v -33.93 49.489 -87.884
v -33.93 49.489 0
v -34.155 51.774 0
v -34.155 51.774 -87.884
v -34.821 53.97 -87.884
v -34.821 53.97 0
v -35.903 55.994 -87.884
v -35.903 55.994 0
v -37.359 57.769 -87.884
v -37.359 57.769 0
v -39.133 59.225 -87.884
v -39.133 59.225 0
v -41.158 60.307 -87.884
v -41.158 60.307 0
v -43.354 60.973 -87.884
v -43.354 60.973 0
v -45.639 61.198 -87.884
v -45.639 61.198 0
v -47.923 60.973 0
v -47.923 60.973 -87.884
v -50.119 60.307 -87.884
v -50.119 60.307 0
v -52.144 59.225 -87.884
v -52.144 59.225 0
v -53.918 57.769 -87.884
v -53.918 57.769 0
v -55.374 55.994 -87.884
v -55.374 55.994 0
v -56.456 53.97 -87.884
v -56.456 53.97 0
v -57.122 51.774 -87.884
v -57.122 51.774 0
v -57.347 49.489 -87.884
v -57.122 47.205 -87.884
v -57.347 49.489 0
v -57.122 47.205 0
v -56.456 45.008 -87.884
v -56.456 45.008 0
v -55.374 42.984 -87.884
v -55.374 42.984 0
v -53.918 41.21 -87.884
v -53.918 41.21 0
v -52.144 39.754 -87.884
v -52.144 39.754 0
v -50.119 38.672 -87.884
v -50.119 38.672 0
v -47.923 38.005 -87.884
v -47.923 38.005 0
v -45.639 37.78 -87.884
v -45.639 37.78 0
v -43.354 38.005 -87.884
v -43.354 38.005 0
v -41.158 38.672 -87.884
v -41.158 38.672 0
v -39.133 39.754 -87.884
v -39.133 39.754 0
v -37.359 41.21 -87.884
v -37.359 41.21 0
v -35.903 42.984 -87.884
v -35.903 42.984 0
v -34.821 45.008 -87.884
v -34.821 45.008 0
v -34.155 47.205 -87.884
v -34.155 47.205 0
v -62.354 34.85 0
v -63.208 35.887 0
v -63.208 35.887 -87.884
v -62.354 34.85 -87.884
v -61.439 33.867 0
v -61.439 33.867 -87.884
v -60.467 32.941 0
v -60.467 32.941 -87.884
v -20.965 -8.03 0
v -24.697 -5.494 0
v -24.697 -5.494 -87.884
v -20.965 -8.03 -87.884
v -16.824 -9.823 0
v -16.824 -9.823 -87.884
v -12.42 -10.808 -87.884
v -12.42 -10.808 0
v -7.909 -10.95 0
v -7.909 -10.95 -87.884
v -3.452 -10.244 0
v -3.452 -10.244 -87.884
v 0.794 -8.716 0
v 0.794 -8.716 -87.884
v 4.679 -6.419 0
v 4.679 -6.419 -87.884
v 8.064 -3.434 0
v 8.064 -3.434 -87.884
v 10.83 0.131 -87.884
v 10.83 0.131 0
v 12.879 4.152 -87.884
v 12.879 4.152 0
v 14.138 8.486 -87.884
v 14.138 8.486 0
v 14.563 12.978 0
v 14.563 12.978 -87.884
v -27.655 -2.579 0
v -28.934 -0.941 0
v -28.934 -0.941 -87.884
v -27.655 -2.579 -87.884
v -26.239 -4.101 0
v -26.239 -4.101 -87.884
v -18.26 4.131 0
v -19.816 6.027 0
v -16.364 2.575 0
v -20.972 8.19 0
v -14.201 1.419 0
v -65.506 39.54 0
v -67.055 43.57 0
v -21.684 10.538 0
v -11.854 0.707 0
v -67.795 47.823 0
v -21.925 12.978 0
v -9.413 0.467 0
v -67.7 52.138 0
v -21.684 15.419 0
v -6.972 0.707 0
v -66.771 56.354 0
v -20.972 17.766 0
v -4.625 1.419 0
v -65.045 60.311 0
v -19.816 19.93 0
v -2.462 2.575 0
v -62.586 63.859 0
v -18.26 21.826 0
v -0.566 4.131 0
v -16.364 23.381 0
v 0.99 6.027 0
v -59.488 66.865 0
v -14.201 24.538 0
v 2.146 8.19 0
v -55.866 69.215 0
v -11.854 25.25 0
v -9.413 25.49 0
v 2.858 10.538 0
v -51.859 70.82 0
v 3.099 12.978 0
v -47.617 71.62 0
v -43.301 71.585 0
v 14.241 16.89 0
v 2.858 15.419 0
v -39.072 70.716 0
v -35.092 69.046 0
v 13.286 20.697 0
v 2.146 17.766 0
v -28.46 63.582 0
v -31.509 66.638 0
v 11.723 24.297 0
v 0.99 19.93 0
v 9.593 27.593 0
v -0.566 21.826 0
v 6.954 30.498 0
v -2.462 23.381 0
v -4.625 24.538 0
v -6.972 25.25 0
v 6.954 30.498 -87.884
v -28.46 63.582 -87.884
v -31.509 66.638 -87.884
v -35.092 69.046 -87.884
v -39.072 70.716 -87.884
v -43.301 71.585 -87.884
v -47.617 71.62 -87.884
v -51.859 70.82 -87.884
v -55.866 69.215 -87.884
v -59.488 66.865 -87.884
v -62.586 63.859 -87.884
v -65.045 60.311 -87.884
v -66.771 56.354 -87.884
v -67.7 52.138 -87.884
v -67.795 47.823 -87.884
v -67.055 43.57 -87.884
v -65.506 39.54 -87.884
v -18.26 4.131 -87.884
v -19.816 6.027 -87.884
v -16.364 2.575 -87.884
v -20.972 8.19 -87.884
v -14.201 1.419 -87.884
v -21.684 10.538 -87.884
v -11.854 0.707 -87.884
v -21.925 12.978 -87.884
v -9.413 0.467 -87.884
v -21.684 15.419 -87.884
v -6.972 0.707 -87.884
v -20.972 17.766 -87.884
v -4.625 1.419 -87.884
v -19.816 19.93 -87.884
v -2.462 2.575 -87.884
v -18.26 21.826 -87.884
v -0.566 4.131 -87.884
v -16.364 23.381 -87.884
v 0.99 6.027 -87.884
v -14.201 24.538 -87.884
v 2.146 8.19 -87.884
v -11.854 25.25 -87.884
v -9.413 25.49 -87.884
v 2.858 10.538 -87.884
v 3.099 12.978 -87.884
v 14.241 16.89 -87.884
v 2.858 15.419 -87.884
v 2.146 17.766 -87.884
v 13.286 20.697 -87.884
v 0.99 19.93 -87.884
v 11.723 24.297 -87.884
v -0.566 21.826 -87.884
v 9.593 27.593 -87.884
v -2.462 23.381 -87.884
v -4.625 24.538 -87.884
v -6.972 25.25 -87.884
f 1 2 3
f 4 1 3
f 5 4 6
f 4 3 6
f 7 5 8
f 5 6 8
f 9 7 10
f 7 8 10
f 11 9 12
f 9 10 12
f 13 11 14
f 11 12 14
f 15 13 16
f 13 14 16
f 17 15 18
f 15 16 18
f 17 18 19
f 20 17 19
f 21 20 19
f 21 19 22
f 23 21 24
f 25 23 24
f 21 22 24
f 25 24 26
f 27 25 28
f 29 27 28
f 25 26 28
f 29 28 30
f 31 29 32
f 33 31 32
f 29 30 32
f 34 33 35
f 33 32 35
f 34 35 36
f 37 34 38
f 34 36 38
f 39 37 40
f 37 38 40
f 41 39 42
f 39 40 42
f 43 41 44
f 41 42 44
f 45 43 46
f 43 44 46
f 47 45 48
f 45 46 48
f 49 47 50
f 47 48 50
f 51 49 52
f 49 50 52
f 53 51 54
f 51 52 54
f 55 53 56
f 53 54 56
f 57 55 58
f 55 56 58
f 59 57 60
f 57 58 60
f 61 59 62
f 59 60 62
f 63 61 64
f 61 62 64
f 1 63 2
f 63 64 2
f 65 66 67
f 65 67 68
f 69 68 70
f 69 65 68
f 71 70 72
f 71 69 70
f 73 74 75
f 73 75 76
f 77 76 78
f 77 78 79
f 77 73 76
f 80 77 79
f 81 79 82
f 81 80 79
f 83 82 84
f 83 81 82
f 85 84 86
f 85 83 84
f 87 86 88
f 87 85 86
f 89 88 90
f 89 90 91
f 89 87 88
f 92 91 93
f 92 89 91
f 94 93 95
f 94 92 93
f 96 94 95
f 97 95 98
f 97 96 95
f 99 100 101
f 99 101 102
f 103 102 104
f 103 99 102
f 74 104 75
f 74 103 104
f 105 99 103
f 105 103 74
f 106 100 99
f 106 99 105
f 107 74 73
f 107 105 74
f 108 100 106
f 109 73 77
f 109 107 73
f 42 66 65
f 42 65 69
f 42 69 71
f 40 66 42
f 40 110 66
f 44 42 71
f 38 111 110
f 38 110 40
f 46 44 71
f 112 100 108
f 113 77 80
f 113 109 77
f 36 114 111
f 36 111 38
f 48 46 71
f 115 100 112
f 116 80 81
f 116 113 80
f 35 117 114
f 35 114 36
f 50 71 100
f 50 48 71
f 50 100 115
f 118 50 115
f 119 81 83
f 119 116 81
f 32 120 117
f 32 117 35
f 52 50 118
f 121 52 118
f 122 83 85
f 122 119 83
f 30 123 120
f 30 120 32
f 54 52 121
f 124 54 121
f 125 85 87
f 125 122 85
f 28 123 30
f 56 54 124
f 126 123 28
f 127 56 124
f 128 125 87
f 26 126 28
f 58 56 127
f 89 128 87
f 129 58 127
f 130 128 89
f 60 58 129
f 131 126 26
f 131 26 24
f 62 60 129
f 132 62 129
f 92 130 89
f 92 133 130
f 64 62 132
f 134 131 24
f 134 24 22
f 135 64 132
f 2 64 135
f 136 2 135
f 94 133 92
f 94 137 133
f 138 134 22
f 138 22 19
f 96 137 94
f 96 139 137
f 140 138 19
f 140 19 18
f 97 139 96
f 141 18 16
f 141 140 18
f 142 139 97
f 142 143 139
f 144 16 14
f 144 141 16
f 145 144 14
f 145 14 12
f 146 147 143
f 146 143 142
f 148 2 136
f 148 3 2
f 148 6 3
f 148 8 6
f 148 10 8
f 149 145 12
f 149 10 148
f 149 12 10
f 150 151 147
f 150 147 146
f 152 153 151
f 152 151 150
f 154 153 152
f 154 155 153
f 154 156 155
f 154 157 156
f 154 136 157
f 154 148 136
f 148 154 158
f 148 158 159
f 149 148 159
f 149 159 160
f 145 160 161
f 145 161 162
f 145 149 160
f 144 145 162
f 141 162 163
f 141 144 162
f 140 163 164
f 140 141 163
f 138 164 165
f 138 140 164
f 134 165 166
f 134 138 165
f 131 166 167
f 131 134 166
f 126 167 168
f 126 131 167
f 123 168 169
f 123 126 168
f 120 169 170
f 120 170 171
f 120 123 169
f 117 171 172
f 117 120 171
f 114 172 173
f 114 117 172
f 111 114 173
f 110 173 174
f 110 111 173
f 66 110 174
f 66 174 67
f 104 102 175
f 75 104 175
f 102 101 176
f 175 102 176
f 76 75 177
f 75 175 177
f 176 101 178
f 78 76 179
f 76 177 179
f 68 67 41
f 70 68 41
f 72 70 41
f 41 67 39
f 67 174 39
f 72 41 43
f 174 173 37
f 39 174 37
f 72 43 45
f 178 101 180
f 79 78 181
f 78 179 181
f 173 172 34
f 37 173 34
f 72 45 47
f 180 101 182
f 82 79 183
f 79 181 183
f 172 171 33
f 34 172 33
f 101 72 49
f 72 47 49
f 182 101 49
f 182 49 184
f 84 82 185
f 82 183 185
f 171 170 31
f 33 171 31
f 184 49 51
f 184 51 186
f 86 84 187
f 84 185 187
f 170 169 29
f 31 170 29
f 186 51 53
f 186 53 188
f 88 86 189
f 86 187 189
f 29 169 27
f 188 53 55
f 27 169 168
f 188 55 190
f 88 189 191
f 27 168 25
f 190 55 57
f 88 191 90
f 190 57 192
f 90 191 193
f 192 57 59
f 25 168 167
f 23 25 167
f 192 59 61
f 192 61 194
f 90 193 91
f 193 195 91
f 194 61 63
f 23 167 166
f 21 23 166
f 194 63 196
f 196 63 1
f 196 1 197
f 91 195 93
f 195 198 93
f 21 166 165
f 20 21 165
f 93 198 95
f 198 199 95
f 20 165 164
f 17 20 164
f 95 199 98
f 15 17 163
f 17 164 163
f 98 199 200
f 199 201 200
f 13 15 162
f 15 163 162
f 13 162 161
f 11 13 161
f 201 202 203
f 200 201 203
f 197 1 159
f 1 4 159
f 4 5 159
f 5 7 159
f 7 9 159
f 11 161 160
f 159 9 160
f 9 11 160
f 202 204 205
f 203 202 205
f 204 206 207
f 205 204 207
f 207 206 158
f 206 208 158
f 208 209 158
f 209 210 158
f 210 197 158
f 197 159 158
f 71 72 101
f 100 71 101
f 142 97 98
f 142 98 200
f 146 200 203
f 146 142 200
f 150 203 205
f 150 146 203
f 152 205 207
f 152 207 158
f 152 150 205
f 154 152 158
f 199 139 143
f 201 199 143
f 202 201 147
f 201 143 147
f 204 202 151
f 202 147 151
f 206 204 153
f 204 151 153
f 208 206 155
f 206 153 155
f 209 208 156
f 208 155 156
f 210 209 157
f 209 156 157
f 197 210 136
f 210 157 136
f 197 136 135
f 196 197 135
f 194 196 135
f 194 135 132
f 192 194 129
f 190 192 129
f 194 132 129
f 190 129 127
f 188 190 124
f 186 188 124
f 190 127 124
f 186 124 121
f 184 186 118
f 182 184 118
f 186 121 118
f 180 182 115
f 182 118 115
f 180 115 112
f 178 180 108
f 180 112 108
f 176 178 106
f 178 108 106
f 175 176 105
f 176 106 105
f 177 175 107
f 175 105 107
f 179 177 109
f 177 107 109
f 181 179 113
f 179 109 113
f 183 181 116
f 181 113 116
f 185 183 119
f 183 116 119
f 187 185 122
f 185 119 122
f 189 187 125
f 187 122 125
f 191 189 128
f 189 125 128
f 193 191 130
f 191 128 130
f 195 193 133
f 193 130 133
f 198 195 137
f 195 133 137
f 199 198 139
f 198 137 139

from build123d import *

# Parameters (mm, degrees)
F0_R     = 11.708772
F0_R_2   = 12.511631
F1_DEPTH = 87.884


with BuildPart() as f1:
    # F0 (on Top) → F1 (new body)
    with BuildSketch(Plane.XY):
        with BuildLine():
            ThreePointArc((-60.466758, 32.941471), (-36.576779, 29.201541), (-23.419007, 49.489252))
            ThreePointArc((-23.419007, 49.489252), (-24.717173, 56.972833), (-28.459983, 63.581963))
            ThreePointArc((-28.459983, 63.581963), (-59.487612, 66.864763), (-63.20755, 35.886503))
            Line((-63.20755, 35.886503), (-60.466758, 32.941471))
        make_face()
        with Locations((-45.638505, 49.489252)):
            Circle(F0_R, mode=Mode.SUBTRACT)
        with BuildLine():
            ThreePointArc((-28.459983, 63.581963), (-24.717173, 56.972833), (-23.419007, 49.489252))
            ThreePointArc((-23.419007, 49.489252), (-36.576779, 29.201541), (-60.466758, 32.941471))
            Line((-60.466758, 32.941471), (-28.93399, -0.941065))
            ThreePointArc((-28.93399, -0.941065), (-25.211548, 31.012543), (6.954043, 30.498322))
            Line((6.954043, 30.498322), (-28.459983, 63.581963))
        make_face()
        with BuildLine():
            ThreePointArc((-63.20755, 35.886503), (-61.903945, 34.351828), (-60.466758, 32.941471))
            Line((-60.466758, 32.941471), (-63.20755, 35.886503))
        make_face()
        with BuildLine():
            ThreePointArc((14.562543, 12.978454), (12.578309, 22.528782), (6.954043, 30.498322))
            ThreePointArc((6.954043, 30.498322), (-25.211548, 31.012543), (-28.93399, -0.941065))
            Line((-28.93399, -0.941065), (-24.697207, -5.493566))
            ThreePointArc((-24.697207, -5.493566), (0.794317, -8.71569), (14.562543, 12.978454))
        make_face()
        with Locations((-9.412947, 12.978454)):
            Circle(F0_R_2, mode=Mode.SUBTRACT)
        with BuildLine():
            Line((-24.697207, -5.493566), (-28.93399, -0.941065))
            ThreePointArc((-28.93399, -0.941065), (-26.963833, -3.35527), (-24.697207, -5.493566))
        make_face()
    extrude(amount=-F1_DEPTH)


solid = f1.part
